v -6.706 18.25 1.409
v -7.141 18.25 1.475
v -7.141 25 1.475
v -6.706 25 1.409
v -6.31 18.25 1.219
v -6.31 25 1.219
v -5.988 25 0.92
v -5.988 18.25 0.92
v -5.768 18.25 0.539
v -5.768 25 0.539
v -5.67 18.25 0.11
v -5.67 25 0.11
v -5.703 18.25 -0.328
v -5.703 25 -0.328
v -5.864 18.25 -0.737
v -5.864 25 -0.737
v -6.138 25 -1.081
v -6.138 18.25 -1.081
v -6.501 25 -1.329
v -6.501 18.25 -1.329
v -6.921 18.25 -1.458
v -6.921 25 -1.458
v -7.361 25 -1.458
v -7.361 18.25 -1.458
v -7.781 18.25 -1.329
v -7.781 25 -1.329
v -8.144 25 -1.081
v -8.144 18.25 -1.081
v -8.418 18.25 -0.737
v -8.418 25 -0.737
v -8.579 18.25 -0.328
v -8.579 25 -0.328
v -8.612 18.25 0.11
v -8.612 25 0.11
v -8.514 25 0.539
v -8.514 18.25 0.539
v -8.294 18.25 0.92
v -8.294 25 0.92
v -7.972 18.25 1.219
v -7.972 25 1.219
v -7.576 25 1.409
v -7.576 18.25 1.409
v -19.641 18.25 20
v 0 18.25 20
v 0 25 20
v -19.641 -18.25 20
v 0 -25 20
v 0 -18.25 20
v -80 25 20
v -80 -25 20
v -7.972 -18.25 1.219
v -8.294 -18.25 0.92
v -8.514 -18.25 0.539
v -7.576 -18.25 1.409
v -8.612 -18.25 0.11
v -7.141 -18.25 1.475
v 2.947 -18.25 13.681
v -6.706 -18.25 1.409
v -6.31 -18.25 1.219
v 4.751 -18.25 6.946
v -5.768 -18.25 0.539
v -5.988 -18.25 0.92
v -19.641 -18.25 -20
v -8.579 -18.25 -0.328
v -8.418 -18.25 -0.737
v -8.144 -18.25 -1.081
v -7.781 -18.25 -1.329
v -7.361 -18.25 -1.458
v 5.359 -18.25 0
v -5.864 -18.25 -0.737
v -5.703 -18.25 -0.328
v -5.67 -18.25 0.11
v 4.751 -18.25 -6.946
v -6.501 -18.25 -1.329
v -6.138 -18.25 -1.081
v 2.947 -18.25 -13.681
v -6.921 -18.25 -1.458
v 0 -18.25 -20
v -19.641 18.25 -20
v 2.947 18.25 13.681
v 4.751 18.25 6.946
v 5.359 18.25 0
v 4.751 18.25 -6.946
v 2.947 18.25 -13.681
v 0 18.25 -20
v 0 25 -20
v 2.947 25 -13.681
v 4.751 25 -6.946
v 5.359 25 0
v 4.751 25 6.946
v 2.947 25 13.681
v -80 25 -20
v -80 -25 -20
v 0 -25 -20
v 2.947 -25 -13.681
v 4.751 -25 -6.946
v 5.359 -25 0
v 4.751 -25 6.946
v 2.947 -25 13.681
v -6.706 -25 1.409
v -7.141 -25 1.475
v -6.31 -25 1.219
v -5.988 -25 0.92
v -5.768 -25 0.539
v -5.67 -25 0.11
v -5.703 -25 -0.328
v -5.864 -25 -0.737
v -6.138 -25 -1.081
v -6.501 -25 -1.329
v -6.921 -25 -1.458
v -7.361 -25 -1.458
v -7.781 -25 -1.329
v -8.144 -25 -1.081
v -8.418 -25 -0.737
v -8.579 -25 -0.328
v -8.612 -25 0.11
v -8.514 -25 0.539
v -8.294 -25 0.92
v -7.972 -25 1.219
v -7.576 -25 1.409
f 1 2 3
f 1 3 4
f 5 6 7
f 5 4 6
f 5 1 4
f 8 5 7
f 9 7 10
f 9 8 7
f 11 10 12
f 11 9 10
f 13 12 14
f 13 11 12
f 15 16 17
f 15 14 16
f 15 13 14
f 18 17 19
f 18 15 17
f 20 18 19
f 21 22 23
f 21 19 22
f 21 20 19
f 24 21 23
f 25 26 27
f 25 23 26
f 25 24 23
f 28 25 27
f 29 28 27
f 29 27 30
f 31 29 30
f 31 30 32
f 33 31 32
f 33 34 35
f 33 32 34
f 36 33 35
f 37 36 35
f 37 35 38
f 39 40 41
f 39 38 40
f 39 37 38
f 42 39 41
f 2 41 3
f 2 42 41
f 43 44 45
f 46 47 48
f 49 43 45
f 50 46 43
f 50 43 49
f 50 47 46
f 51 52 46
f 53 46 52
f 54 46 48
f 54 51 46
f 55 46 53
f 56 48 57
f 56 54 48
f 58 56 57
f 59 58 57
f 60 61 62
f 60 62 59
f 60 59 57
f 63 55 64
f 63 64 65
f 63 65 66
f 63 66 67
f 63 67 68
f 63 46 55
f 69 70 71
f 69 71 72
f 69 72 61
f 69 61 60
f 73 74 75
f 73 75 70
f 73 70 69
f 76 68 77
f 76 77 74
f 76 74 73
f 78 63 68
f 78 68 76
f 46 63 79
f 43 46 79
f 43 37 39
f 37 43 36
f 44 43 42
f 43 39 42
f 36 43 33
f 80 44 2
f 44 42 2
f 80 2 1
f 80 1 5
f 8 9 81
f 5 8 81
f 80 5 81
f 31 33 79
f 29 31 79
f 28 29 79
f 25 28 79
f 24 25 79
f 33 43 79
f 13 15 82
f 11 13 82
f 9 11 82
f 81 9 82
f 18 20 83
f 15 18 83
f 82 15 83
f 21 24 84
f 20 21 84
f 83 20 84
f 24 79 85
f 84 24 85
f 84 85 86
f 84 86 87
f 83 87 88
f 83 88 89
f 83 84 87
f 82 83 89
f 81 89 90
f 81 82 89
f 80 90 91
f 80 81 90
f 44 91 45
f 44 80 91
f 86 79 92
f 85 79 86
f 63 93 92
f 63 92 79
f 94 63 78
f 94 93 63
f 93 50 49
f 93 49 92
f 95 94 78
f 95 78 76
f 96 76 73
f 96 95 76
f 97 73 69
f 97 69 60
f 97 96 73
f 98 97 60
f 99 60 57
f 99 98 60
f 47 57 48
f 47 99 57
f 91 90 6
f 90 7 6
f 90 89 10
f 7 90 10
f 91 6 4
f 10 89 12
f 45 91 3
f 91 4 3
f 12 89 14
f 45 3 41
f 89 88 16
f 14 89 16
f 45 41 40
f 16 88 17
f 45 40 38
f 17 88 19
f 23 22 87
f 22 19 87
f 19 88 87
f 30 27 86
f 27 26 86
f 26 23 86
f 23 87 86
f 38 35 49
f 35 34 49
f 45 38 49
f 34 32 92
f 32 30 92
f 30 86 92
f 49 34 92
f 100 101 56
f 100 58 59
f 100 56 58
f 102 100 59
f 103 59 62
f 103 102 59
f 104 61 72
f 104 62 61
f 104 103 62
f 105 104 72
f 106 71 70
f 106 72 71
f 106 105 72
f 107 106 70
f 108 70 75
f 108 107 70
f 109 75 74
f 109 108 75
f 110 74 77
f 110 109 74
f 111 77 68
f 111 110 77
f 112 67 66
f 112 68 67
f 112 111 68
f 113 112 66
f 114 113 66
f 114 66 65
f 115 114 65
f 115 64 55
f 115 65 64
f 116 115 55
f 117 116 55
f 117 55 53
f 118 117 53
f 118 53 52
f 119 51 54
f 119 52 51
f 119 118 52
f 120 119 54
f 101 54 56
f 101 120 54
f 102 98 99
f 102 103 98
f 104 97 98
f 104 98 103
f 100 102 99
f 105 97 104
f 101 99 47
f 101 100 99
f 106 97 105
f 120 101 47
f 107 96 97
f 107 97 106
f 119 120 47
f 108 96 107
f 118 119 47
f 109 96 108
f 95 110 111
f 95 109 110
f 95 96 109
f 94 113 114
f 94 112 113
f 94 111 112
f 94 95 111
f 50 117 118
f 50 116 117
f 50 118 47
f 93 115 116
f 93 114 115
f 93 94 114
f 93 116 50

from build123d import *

# Parameters (mm, degrees)
BOSS_EXTRUDE1_DEPTH      = 25
BOSS_EXTRUDE1_DEPTH_BACK = 25
CUT_EXTRUDE2_DEPTH       = 87.168439698
CUT_EXTRUDE2_DEPTH_BACK  = 87.168439698
SKETCH3_W                = 27.604398764
SKETCH3_H                = 36.5
CUT_EXTRUDE3_DEPTH       = 87.168439698
CUT_EXTRUDE3_DEPTH_BACK  = 87.168439698
SKETCH4_R                = 1.47496879


with BuildPart() as part:
    # Sketch1 → Boss-Extrude1 (new, two sides: drawn at the far end of the back side and taken through both)
    with BuildSketch(Plane(origin=(0, 0, 0), x_dir=(1, 0, 0), z_dir=(0, 1, 0)).offset(-BOSS_EXTRUDE1_DEPTH_BACK)):
        with BuildLine():
            Line((0, -20), (-80, -20))
            Line((-80, -20), (-80, 20))
            Line((-80, 20), (0, 20))
            ThreePointArc((0, 20), (5.358983849, 0), (0, -20))
        make_face()
    extrude(amount=BOSS_EXTRUDE1_DEPTH + BOSS_EXTRUDE1_DEPTH_BACK)

    # Sketch3 → Cut-Extrude2 (cut, two sides: drawn at the far end of the back side and taken through both)
    with BuildSketch(Plane.XY.offset(-CUT_EXTRUDE2_DEPTH_BACK)):
        with Locations((-5.838816769, 0)):
            Rectangle(SKETCH3_W, SKETCH3_H)
    extrude(amount=CUT_EXTRUDE2_DEPTH + CUT_EXTRUDE2_DEPTH_BACK, mode=Mode.SUBTRACT)

    # Sketch4 → Cut-Extrude3 (cut, two sides: drawn at the far end of the back side and taken through both)
    with BuildSketch(Plane(origin=(0, 0, 0), x_dir=(1, 0, 0), z_dir=(0, 1, 0)).offset(-CUT_EXTRUDE3_DEPTH_BACK)):
        with Locations((-7.141016151, 0)):
            Circle(SKETCH4_R)
    extrude(amount=CUT_EXTRUDE3_DEPTH + CUT_EXTRUDE3_DEPTH_BACK, mode=Mode.SUBTRACT)


solid = part.part
